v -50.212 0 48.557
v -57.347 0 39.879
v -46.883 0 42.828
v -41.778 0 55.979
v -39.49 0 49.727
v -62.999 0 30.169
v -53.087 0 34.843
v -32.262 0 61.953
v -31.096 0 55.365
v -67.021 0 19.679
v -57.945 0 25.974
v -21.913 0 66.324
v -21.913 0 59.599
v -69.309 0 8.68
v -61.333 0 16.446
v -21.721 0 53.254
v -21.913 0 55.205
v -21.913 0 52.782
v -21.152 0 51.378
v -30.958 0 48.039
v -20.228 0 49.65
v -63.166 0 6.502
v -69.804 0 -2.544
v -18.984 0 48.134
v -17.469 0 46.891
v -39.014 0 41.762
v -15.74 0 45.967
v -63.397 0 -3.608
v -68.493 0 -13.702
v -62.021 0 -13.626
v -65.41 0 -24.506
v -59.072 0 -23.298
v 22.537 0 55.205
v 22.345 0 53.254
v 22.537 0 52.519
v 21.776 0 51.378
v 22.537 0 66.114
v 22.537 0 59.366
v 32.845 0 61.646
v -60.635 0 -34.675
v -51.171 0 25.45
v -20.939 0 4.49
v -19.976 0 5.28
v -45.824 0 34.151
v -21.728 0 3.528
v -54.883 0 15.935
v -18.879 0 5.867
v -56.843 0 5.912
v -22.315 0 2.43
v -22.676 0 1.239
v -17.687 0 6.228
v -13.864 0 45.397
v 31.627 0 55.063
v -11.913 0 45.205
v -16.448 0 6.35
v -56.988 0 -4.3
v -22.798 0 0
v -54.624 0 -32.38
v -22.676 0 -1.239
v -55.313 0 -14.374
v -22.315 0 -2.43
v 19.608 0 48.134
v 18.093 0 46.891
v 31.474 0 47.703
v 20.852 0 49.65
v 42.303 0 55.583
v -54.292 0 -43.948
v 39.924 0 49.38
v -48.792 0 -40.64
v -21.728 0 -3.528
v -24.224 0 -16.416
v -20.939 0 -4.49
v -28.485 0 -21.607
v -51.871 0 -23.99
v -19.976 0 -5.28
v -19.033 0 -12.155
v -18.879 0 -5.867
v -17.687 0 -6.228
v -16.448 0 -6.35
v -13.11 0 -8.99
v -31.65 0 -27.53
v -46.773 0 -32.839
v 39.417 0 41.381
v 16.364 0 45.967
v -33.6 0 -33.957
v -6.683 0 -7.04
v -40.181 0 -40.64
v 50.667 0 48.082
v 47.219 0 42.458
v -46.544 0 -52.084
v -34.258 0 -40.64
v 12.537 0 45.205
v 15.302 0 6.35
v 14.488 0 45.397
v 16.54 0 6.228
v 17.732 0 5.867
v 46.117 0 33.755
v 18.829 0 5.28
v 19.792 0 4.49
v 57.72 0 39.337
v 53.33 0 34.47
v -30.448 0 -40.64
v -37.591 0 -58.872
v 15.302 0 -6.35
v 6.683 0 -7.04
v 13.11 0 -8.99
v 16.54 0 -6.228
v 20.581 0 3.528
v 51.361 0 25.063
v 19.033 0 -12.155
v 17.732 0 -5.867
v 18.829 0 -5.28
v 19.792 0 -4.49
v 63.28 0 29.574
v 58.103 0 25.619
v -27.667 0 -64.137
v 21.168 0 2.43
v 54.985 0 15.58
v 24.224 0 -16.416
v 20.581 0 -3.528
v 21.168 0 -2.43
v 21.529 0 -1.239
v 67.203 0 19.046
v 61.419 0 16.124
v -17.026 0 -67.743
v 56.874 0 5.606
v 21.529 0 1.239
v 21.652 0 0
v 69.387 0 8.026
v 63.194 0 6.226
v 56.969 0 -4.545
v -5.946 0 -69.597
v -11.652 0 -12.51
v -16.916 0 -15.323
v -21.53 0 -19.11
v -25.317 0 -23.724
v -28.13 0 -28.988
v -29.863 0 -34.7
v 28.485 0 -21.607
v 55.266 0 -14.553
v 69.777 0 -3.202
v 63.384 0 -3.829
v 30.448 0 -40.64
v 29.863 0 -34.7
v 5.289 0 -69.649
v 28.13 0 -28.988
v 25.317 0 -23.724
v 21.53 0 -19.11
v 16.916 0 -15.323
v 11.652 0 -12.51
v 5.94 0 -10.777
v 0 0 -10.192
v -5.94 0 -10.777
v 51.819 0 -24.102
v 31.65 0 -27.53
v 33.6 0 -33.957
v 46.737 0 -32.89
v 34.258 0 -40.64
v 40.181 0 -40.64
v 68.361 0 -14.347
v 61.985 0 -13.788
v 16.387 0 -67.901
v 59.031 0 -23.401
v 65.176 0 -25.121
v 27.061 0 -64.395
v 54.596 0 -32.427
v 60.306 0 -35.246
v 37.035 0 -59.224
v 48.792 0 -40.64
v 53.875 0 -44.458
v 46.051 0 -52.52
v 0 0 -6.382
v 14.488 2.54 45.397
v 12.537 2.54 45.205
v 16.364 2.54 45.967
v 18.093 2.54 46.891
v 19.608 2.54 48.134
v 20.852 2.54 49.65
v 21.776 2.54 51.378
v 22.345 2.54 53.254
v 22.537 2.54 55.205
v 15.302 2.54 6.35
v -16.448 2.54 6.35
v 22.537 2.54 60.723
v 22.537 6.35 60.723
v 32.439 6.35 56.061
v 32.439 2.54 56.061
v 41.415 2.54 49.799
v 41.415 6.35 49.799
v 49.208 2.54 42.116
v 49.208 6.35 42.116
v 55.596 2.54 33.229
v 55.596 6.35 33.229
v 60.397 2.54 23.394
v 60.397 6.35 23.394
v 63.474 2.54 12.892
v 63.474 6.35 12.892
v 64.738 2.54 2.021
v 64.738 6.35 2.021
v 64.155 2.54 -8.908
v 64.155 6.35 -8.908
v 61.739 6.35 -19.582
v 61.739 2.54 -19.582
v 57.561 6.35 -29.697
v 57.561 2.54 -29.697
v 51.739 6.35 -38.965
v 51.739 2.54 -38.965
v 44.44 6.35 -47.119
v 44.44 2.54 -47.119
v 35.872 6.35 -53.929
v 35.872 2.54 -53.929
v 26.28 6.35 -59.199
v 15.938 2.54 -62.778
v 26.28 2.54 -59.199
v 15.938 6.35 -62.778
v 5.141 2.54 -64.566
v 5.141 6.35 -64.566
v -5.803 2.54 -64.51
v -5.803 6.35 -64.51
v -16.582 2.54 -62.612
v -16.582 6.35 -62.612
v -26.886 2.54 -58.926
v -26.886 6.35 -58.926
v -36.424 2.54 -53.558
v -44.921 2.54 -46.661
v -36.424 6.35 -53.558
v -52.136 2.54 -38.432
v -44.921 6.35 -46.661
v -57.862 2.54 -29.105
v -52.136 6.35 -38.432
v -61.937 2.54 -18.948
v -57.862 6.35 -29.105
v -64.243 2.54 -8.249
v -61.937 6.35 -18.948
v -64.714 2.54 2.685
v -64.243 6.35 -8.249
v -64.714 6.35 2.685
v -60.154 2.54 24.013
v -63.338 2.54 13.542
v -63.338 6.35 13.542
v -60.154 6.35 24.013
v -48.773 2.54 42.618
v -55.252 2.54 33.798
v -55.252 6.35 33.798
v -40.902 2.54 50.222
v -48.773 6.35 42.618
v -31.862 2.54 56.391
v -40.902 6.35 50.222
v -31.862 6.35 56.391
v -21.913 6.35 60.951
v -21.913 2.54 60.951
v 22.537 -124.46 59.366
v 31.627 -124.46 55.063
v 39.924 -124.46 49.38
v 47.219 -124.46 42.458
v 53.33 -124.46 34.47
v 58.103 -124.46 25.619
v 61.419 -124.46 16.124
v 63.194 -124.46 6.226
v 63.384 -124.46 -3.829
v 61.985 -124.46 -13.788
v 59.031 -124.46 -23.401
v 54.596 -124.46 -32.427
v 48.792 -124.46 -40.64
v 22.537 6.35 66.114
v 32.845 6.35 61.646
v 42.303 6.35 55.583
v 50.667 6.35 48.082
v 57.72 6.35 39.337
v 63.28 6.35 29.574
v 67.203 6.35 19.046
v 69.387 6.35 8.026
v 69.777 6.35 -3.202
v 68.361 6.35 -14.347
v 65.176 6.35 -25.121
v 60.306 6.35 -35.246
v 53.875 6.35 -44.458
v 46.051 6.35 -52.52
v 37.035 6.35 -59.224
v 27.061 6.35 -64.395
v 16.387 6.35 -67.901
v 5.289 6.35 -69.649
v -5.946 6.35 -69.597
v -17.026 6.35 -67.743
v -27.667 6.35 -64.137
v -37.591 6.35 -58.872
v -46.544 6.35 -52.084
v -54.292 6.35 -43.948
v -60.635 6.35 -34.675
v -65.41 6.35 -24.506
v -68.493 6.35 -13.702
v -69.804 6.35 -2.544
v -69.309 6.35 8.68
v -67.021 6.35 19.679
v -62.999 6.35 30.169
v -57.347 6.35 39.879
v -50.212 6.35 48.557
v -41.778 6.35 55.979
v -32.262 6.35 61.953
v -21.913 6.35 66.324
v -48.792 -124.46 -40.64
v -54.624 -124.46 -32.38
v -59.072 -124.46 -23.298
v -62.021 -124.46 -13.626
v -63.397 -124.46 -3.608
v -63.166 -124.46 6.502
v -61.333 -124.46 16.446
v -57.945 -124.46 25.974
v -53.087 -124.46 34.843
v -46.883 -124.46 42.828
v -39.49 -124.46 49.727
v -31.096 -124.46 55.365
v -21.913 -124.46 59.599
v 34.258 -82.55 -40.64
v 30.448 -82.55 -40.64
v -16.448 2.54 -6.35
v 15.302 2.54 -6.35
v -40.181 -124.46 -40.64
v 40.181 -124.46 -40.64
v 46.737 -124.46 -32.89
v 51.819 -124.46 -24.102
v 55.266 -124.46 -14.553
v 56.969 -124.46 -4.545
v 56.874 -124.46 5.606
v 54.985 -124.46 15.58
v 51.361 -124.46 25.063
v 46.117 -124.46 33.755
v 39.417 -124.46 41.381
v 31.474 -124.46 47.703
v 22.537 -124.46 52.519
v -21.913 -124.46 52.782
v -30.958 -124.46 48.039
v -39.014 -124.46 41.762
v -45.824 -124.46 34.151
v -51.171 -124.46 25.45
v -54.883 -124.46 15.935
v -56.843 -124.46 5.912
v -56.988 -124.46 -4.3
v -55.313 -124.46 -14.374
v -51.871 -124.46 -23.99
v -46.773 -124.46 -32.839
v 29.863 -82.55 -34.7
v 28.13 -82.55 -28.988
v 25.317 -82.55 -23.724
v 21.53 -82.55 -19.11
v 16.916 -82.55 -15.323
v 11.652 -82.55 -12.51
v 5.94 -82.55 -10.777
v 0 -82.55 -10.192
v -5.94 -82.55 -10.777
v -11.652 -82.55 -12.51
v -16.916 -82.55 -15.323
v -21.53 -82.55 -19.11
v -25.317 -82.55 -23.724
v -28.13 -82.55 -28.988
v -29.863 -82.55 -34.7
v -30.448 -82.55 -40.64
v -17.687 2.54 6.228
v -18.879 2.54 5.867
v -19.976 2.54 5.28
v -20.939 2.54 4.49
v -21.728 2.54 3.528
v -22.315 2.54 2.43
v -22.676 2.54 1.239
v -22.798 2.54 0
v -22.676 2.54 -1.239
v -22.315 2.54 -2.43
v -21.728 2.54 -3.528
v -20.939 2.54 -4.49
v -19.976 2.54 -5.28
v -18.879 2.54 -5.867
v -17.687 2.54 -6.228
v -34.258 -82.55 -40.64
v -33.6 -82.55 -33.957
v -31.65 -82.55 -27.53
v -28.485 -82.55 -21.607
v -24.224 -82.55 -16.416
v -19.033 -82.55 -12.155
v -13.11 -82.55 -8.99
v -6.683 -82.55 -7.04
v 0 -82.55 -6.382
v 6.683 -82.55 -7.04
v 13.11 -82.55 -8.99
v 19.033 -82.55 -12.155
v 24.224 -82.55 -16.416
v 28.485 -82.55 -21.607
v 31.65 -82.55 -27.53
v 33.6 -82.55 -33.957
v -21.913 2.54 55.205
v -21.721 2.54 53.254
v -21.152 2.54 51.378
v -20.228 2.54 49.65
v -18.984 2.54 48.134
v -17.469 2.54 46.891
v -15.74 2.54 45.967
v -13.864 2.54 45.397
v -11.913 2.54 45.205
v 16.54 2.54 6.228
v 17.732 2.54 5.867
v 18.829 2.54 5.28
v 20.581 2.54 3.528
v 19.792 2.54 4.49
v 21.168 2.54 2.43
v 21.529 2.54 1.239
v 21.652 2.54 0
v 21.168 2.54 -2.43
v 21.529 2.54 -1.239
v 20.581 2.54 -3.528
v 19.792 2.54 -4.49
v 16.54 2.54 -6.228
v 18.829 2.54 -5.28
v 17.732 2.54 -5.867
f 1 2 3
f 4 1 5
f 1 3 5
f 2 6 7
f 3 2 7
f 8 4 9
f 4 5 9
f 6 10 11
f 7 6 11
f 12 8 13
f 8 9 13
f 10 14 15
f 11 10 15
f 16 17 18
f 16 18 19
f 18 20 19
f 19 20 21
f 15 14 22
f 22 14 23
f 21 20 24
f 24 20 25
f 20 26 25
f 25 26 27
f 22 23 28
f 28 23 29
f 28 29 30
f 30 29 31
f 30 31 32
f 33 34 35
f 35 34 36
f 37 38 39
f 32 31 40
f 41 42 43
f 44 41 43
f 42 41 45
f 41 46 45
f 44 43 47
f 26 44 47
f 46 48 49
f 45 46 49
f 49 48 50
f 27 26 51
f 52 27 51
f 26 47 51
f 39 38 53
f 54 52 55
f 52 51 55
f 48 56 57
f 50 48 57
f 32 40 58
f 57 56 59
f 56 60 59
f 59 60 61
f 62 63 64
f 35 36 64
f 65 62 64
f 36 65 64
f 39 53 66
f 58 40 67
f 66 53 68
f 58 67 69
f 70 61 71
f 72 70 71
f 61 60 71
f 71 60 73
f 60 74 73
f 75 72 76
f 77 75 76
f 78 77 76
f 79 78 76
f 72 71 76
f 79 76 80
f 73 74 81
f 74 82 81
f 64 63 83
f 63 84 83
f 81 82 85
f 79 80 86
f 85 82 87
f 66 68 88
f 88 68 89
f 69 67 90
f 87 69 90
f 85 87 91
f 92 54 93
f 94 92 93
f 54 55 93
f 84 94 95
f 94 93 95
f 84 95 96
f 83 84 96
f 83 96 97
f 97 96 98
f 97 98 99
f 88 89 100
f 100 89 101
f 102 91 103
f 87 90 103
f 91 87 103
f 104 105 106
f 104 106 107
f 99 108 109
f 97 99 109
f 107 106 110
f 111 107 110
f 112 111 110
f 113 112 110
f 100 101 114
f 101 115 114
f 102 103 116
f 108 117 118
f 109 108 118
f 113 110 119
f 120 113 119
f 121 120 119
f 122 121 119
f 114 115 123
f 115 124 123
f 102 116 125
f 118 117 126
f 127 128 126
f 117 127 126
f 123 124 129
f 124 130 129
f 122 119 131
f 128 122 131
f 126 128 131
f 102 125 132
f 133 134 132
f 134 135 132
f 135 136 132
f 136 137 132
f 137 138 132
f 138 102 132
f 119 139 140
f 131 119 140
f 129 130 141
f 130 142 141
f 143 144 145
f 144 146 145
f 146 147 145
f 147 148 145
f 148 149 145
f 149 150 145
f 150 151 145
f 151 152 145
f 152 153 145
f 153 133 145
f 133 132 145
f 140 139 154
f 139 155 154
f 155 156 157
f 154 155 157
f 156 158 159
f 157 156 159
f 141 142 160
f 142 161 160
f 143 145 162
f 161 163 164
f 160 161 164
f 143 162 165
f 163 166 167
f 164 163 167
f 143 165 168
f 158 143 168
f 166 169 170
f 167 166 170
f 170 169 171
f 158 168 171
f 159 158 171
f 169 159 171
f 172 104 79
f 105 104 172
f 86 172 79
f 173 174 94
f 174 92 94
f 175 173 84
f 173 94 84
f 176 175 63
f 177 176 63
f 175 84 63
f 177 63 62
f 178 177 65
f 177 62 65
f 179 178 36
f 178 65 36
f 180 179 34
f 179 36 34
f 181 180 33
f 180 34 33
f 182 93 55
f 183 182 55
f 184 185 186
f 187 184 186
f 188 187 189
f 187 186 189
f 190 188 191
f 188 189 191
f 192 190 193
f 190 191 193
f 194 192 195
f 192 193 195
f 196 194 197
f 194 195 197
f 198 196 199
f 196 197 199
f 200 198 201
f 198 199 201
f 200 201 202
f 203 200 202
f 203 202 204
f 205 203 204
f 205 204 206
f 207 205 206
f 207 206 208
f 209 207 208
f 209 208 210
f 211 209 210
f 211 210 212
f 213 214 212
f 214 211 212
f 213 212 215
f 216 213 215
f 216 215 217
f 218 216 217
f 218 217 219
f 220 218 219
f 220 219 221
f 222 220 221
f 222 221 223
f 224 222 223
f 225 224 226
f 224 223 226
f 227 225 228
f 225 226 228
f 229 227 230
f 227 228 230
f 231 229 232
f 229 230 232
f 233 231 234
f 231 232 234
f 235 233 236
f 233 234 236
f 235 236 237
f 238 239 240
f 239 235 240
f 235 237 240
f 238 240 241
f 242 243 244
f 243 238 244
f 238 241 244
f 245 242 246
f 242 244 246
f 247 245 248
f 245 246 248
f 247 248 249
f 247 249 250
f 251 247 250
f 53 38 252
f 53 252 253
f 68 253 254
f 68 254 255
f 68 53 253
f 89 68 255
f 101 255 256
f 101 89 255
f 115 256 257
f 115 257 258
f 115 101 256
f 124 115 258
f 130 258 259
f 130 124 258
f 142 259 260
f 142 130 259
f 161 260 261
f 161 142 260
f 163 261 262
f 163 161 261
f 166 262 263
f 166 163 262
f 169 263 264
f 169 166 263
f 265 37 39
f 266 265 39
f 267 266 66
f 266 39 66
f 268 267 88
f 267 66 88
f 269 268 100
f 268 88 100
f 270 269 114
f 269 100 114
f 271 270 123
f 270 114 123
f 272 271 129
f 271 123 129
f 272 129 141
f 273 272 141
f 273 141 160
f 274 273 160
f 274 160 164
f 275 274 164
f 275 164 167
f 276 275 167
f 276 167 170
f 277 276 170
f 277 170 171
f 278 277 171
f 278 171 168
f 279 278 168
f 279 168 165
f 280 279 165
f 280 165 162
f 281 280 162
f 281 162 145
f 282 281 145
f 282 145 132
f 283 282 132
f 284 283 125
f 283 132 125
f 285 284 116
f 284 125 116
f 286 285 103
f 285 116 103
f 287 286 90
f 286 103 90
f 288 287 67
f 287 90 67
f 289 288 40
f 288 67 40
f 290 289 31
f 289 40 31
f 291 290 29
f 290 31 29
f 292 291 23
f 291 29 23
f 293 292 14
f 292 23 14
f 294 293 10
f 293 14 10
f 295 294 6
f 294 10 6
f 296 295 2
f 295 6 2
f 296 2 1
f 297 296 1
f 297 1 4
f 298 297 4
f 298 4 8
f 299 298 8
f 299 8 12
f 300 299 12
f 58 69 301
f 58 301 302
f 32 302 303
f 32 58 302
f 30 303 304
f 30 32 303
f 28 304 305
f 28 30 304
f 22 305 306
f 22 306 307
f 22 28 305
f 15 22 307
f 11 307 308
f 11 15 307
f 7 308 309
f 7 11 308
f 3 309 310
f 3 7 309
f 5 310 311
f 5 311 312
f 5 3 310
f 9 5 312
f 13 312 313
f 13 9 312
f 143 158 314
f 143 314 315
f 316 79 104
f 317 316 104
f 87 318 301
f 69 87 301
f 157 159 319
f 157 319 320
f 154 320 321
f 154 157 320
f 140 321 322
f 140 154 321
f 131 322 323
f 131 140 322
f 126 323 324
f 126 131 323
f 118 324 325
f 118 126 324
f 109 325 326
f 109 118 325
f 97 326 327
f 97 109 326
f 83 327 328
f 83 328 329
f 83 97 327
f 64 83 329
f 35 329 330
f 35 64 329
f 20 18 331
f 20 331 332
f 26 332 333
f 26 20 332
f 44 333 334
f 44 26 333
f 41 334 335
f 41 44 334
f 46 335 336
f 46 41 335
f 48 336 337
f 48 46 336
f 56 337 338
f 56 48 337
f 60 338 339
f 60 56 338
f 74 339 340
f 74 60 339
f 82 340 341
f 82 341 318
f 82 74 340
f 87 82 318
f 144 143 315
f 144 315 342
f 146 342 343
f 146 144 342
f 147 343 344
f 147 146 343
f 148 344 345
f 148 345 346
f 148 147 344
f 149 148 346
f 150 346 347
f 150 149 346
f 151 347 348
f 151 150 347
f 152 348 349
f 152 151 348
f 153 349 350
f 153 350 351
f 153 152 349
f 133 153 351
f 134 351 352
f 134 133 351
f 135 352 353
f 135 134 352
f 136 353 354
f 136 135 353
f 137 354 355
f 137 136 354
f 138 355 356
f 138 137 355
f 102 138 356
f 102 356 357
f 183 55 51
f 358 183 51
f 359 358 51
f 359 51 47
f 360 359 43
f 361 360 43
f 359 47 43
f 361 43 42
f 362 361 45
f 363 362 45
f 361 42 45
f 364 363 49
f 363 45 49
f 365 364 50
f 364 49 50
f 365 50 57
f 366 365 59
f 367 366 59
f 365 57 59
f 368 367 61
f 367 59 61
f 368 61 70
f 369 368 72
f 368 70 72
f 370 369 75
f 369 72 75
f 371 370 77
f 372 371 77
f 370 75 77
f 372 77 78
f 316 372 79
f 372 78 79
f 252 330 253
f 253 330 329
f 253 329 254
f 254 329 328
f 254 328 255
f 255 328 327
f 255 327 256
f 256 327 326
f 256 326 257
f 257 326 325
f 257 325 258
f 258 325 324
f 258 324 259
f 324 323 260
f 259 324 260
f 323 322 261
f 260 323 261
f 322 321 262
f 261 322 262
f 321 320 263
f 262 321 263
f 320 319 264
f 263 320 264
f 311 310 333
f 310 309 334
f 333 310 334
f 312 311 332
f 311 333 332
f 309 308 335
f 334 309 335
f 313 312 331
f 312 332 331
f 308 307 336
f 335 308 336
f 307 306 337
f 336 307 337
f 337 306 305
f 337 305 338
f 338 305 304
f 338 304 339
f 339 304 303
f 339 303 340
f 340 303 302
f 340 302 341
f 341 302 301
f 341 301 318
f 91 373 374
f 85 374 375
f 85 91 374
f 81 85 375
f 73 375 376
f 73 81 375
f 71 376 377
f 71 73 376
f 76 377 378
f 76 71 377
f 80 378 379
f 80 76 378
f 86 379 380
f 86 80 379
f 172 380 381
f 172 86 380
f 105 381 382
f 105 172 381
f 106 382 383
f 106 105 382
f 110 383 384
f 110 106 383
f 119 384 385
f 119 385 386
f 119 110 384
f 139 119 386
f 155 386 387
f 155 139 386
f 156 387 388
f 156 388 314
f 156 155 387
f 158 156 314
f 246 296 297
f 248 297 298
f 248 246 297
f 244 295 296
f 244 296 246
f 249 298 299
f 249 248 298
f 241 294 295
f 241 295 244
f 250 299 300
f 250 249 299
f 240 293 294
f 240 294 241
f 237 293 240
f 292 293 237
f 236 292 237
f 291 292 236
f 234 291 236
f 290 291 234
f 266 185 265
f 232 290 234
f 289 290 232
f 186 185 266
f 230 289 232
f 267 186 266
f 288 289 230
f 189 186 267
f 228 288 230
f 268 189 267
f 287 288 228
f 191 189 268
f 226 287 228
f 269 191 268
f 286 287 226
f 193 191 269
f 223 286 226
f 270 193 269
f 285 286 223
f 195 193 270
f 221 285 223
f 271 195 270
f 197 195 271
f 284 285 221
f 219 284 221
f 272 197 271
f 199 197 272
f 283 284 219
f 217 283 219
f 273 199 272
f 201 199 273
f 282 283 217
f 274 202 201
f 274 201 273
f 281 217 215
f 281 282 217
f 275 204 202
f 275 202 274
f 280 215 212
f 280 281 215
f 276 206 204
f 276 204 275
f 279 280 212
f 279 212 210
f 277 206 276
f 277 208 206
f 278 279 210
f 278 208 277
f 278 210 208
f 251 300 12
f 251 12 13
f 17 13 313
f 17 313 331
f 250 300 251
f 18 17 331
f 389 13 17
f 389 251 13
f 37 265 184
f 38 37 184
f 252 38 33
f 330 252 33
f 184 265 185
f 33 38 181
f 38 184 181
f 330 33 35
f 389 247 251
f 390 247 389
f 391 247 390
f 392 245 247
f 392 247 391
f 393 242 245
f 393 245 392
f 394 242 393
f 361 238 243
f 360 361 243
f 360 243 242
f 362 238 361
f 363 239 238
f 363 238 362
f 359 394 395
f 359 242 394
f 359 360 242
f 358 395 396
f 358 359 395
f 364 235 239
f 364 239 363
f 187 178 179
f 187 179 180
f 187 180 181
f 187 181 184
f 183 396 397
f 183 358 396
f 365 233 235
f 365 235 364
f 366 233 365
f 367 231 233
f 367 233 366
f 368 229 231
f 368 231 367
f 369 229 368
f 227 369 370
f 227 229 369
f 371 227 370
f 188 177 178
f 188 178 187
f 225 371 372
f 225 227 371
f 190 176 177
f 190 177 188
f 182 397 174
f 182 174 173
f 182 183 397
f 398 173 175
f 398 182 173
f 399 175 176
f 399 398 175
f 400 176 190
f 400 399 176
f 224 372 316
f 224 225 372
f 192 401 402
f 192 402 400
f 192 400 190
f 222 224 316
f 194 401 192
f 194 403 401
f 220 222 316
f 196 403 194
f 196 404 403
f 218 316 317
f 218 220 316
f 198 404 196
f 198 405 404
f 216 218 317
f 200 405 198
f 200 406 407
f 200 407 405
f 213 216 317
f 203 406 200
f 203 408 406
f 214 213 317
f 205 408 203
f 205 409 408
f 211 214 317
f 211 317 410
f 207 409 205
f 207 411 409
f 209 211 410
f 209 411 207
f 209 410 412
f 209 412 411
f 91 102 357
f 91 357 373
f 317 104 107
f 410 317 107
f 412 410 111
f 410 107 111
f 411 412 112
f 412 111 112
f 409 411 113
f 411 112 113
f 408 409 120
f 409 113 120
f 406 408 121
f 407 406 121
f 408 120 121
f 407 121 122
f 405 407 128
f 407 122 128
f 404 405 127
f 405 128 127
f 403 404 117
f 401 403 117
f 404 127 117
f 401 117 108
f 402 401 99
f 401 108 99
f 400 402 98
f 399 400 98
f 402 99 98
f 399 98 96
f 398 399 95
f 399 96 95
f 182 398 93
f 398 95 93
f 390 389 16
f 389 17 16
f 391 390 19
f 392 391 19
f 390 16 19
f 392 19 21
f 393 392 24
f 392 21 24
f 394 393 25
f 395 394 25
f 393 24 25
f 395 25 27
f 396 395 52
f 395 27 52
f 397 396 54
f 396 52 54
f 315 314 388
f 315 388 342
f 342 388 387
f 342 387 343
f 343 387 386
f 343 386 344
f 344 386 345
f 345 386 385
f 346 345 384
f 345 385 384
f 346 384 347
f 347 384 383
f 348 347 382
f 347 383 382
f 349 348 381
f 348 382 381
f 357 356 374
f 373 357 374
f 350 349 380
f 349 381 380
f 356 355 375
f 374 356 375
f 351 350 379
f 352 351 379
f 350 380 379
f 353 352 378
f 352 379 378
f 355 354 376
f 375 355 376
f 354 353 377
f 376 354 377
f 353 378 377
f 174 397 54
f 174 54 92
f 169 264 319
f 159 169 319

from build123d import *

# Parameters (mm, degrees)
SKETCH3_R           = 69.85
BOSS_EXTRUDE1_DEPTH = 6.35
SKETCH4_R           = 64.77
CUT_EXTRUDE1_DEPTH  = 3.81
SKETCH5_W           = 44.45
SKETCH5_H           = 25.4
CUT_EXTRUDE2_DEPTH  = 7.35
FILLET1_R           = 10
BOSS_EXTRUDE2_DEPTH = 82.55
BOSS_EXTRUDE3_DEPTH = 127


with BuildPart() as part:
    # Sketch3 → Boss-Extrude1 (new body)
    with BuildSketch(Plane(origin=(0, 0, 0), x_dir=(1, 0, 0), z_dir=(0, 1, 0))):
        Circle(SKETCH3_R)
        with BuildLine():
            Line((-16.448489627, 6.35), (15.301510373, 6.35))
            ThreePointArc((15.301510373, 6.35), (21.651510373, 0), (15.301510373, -6.35))
            Line((15.301510373, -6.35), (-16.448489627, -6.35))
            ThreePointArc((-16.448489627, -6.35), (-22.798489627, 0), (-16.448489627, 6.35))
        make_face(mode=Mode.SUBTRACT)
    extrude(amount=BOSS_EXTRUDE1_DEPTH)

    # Sketch4 → Cut-Extrude1 (cut)
    with BuildSketch(Plane(origin=(0, 6.35, 0), x_dir=(1, 0, 0), z_dir=(0, 1, 0))):
        Circle(SKETCH4_R)
    extrude(amount=-CUT_EXTRUDE1_DEPTH, mode=Mode.SUBTRACT)

    # Sketch5 → Cut-Extrude2 (cut, through all)
    with BuildSketch(Plane(origin=(0, 6.35, 0), x_dir=(1, 0, 0), z_dir=(0, 1, 0))):
        with Locations((0.312165283, -57.905331129)):
            Rectangle(SKETCH5_W, SKETCH5_H)
    extrude(amount=-CUT_EXTRUDE2_DEPTH, mode=Mode.SUBTRACT)

    # Fillet1
    fillet1_edges = [part.edges().sort_by_distance(p)[0] for p in [
        (22.537165283, 1.27, 45.205331129),
        (-21.912834717, 1.27, 45.205331129),
    ]]
    fillet(fillet1_edges, radius=FILLET1_R)

    # Sketch8 → Boss-Extrude2 (add)
    with BuildSketch(Plane.XZ):
        with BuildLine():
            Line((34.258206884, -40.64), (30.448206884, -40.64))
            ThreePointArc((30.448206884, -40.64), (0, -10.191793116), (-30.448206884, -40.64))
            Line((-30.448206884, -40.64), (-34.258206884, -40.64))
            ThreePointArc((-34.258206884, -40.64), (0, -6.381793116), (34.258206884, -40.64))
        make_face()
    extrude(amount=BOSS_EXTRUDE2_DEPTH)

    # Sketch11 → Boss-Extrude3 (add)
    with BuildSketch(Plane(origin=(0, 2.54, 0), x_dir=(1, 0, 0), z_dir=(0, 1, 0))):
        with BuildLine():
            ThreePointArc((-21.912834717, -52.782100893), (-56.087729184, -10.967640358), (-40.18100173, 40.64))
            Line((-40.18100173, 40.64), (-48.791806689, 40.64))
            ThreePointArc((-48.791806689, 40.64), (-61.333240284, -16.446386725), (-21.912834717, -59.599309347))
            Line((-21.912834717, -59.599309347), (-21.912834717, -55.205331129))
            Line((-21.912834717, -55.205331129), (-21.912834717, -52.782100893))
        make_face()
        with BuildLine():
            Line((48.791806689, 40.64), (40.18100173, 40.64))
            ThreePointArc((40.18100173, 40.64), (56.15176968, -10.634907703), (22.537165283, -52.518555588))
            Line((22.537165283, -52.518555588), (22.537165283, -55.205331129))
            Line((22.537165283, -55.205331129), (22.537165283, -59.366035584))
            ThreePointArc((22.537165283, -59.366035584), (61.418705204, -16.124287613), (48.791806689, 40.64))
        make_face()
    extrude(amount=-BOSS_EXTRUDE3_DEPTH)


solid = part.part
